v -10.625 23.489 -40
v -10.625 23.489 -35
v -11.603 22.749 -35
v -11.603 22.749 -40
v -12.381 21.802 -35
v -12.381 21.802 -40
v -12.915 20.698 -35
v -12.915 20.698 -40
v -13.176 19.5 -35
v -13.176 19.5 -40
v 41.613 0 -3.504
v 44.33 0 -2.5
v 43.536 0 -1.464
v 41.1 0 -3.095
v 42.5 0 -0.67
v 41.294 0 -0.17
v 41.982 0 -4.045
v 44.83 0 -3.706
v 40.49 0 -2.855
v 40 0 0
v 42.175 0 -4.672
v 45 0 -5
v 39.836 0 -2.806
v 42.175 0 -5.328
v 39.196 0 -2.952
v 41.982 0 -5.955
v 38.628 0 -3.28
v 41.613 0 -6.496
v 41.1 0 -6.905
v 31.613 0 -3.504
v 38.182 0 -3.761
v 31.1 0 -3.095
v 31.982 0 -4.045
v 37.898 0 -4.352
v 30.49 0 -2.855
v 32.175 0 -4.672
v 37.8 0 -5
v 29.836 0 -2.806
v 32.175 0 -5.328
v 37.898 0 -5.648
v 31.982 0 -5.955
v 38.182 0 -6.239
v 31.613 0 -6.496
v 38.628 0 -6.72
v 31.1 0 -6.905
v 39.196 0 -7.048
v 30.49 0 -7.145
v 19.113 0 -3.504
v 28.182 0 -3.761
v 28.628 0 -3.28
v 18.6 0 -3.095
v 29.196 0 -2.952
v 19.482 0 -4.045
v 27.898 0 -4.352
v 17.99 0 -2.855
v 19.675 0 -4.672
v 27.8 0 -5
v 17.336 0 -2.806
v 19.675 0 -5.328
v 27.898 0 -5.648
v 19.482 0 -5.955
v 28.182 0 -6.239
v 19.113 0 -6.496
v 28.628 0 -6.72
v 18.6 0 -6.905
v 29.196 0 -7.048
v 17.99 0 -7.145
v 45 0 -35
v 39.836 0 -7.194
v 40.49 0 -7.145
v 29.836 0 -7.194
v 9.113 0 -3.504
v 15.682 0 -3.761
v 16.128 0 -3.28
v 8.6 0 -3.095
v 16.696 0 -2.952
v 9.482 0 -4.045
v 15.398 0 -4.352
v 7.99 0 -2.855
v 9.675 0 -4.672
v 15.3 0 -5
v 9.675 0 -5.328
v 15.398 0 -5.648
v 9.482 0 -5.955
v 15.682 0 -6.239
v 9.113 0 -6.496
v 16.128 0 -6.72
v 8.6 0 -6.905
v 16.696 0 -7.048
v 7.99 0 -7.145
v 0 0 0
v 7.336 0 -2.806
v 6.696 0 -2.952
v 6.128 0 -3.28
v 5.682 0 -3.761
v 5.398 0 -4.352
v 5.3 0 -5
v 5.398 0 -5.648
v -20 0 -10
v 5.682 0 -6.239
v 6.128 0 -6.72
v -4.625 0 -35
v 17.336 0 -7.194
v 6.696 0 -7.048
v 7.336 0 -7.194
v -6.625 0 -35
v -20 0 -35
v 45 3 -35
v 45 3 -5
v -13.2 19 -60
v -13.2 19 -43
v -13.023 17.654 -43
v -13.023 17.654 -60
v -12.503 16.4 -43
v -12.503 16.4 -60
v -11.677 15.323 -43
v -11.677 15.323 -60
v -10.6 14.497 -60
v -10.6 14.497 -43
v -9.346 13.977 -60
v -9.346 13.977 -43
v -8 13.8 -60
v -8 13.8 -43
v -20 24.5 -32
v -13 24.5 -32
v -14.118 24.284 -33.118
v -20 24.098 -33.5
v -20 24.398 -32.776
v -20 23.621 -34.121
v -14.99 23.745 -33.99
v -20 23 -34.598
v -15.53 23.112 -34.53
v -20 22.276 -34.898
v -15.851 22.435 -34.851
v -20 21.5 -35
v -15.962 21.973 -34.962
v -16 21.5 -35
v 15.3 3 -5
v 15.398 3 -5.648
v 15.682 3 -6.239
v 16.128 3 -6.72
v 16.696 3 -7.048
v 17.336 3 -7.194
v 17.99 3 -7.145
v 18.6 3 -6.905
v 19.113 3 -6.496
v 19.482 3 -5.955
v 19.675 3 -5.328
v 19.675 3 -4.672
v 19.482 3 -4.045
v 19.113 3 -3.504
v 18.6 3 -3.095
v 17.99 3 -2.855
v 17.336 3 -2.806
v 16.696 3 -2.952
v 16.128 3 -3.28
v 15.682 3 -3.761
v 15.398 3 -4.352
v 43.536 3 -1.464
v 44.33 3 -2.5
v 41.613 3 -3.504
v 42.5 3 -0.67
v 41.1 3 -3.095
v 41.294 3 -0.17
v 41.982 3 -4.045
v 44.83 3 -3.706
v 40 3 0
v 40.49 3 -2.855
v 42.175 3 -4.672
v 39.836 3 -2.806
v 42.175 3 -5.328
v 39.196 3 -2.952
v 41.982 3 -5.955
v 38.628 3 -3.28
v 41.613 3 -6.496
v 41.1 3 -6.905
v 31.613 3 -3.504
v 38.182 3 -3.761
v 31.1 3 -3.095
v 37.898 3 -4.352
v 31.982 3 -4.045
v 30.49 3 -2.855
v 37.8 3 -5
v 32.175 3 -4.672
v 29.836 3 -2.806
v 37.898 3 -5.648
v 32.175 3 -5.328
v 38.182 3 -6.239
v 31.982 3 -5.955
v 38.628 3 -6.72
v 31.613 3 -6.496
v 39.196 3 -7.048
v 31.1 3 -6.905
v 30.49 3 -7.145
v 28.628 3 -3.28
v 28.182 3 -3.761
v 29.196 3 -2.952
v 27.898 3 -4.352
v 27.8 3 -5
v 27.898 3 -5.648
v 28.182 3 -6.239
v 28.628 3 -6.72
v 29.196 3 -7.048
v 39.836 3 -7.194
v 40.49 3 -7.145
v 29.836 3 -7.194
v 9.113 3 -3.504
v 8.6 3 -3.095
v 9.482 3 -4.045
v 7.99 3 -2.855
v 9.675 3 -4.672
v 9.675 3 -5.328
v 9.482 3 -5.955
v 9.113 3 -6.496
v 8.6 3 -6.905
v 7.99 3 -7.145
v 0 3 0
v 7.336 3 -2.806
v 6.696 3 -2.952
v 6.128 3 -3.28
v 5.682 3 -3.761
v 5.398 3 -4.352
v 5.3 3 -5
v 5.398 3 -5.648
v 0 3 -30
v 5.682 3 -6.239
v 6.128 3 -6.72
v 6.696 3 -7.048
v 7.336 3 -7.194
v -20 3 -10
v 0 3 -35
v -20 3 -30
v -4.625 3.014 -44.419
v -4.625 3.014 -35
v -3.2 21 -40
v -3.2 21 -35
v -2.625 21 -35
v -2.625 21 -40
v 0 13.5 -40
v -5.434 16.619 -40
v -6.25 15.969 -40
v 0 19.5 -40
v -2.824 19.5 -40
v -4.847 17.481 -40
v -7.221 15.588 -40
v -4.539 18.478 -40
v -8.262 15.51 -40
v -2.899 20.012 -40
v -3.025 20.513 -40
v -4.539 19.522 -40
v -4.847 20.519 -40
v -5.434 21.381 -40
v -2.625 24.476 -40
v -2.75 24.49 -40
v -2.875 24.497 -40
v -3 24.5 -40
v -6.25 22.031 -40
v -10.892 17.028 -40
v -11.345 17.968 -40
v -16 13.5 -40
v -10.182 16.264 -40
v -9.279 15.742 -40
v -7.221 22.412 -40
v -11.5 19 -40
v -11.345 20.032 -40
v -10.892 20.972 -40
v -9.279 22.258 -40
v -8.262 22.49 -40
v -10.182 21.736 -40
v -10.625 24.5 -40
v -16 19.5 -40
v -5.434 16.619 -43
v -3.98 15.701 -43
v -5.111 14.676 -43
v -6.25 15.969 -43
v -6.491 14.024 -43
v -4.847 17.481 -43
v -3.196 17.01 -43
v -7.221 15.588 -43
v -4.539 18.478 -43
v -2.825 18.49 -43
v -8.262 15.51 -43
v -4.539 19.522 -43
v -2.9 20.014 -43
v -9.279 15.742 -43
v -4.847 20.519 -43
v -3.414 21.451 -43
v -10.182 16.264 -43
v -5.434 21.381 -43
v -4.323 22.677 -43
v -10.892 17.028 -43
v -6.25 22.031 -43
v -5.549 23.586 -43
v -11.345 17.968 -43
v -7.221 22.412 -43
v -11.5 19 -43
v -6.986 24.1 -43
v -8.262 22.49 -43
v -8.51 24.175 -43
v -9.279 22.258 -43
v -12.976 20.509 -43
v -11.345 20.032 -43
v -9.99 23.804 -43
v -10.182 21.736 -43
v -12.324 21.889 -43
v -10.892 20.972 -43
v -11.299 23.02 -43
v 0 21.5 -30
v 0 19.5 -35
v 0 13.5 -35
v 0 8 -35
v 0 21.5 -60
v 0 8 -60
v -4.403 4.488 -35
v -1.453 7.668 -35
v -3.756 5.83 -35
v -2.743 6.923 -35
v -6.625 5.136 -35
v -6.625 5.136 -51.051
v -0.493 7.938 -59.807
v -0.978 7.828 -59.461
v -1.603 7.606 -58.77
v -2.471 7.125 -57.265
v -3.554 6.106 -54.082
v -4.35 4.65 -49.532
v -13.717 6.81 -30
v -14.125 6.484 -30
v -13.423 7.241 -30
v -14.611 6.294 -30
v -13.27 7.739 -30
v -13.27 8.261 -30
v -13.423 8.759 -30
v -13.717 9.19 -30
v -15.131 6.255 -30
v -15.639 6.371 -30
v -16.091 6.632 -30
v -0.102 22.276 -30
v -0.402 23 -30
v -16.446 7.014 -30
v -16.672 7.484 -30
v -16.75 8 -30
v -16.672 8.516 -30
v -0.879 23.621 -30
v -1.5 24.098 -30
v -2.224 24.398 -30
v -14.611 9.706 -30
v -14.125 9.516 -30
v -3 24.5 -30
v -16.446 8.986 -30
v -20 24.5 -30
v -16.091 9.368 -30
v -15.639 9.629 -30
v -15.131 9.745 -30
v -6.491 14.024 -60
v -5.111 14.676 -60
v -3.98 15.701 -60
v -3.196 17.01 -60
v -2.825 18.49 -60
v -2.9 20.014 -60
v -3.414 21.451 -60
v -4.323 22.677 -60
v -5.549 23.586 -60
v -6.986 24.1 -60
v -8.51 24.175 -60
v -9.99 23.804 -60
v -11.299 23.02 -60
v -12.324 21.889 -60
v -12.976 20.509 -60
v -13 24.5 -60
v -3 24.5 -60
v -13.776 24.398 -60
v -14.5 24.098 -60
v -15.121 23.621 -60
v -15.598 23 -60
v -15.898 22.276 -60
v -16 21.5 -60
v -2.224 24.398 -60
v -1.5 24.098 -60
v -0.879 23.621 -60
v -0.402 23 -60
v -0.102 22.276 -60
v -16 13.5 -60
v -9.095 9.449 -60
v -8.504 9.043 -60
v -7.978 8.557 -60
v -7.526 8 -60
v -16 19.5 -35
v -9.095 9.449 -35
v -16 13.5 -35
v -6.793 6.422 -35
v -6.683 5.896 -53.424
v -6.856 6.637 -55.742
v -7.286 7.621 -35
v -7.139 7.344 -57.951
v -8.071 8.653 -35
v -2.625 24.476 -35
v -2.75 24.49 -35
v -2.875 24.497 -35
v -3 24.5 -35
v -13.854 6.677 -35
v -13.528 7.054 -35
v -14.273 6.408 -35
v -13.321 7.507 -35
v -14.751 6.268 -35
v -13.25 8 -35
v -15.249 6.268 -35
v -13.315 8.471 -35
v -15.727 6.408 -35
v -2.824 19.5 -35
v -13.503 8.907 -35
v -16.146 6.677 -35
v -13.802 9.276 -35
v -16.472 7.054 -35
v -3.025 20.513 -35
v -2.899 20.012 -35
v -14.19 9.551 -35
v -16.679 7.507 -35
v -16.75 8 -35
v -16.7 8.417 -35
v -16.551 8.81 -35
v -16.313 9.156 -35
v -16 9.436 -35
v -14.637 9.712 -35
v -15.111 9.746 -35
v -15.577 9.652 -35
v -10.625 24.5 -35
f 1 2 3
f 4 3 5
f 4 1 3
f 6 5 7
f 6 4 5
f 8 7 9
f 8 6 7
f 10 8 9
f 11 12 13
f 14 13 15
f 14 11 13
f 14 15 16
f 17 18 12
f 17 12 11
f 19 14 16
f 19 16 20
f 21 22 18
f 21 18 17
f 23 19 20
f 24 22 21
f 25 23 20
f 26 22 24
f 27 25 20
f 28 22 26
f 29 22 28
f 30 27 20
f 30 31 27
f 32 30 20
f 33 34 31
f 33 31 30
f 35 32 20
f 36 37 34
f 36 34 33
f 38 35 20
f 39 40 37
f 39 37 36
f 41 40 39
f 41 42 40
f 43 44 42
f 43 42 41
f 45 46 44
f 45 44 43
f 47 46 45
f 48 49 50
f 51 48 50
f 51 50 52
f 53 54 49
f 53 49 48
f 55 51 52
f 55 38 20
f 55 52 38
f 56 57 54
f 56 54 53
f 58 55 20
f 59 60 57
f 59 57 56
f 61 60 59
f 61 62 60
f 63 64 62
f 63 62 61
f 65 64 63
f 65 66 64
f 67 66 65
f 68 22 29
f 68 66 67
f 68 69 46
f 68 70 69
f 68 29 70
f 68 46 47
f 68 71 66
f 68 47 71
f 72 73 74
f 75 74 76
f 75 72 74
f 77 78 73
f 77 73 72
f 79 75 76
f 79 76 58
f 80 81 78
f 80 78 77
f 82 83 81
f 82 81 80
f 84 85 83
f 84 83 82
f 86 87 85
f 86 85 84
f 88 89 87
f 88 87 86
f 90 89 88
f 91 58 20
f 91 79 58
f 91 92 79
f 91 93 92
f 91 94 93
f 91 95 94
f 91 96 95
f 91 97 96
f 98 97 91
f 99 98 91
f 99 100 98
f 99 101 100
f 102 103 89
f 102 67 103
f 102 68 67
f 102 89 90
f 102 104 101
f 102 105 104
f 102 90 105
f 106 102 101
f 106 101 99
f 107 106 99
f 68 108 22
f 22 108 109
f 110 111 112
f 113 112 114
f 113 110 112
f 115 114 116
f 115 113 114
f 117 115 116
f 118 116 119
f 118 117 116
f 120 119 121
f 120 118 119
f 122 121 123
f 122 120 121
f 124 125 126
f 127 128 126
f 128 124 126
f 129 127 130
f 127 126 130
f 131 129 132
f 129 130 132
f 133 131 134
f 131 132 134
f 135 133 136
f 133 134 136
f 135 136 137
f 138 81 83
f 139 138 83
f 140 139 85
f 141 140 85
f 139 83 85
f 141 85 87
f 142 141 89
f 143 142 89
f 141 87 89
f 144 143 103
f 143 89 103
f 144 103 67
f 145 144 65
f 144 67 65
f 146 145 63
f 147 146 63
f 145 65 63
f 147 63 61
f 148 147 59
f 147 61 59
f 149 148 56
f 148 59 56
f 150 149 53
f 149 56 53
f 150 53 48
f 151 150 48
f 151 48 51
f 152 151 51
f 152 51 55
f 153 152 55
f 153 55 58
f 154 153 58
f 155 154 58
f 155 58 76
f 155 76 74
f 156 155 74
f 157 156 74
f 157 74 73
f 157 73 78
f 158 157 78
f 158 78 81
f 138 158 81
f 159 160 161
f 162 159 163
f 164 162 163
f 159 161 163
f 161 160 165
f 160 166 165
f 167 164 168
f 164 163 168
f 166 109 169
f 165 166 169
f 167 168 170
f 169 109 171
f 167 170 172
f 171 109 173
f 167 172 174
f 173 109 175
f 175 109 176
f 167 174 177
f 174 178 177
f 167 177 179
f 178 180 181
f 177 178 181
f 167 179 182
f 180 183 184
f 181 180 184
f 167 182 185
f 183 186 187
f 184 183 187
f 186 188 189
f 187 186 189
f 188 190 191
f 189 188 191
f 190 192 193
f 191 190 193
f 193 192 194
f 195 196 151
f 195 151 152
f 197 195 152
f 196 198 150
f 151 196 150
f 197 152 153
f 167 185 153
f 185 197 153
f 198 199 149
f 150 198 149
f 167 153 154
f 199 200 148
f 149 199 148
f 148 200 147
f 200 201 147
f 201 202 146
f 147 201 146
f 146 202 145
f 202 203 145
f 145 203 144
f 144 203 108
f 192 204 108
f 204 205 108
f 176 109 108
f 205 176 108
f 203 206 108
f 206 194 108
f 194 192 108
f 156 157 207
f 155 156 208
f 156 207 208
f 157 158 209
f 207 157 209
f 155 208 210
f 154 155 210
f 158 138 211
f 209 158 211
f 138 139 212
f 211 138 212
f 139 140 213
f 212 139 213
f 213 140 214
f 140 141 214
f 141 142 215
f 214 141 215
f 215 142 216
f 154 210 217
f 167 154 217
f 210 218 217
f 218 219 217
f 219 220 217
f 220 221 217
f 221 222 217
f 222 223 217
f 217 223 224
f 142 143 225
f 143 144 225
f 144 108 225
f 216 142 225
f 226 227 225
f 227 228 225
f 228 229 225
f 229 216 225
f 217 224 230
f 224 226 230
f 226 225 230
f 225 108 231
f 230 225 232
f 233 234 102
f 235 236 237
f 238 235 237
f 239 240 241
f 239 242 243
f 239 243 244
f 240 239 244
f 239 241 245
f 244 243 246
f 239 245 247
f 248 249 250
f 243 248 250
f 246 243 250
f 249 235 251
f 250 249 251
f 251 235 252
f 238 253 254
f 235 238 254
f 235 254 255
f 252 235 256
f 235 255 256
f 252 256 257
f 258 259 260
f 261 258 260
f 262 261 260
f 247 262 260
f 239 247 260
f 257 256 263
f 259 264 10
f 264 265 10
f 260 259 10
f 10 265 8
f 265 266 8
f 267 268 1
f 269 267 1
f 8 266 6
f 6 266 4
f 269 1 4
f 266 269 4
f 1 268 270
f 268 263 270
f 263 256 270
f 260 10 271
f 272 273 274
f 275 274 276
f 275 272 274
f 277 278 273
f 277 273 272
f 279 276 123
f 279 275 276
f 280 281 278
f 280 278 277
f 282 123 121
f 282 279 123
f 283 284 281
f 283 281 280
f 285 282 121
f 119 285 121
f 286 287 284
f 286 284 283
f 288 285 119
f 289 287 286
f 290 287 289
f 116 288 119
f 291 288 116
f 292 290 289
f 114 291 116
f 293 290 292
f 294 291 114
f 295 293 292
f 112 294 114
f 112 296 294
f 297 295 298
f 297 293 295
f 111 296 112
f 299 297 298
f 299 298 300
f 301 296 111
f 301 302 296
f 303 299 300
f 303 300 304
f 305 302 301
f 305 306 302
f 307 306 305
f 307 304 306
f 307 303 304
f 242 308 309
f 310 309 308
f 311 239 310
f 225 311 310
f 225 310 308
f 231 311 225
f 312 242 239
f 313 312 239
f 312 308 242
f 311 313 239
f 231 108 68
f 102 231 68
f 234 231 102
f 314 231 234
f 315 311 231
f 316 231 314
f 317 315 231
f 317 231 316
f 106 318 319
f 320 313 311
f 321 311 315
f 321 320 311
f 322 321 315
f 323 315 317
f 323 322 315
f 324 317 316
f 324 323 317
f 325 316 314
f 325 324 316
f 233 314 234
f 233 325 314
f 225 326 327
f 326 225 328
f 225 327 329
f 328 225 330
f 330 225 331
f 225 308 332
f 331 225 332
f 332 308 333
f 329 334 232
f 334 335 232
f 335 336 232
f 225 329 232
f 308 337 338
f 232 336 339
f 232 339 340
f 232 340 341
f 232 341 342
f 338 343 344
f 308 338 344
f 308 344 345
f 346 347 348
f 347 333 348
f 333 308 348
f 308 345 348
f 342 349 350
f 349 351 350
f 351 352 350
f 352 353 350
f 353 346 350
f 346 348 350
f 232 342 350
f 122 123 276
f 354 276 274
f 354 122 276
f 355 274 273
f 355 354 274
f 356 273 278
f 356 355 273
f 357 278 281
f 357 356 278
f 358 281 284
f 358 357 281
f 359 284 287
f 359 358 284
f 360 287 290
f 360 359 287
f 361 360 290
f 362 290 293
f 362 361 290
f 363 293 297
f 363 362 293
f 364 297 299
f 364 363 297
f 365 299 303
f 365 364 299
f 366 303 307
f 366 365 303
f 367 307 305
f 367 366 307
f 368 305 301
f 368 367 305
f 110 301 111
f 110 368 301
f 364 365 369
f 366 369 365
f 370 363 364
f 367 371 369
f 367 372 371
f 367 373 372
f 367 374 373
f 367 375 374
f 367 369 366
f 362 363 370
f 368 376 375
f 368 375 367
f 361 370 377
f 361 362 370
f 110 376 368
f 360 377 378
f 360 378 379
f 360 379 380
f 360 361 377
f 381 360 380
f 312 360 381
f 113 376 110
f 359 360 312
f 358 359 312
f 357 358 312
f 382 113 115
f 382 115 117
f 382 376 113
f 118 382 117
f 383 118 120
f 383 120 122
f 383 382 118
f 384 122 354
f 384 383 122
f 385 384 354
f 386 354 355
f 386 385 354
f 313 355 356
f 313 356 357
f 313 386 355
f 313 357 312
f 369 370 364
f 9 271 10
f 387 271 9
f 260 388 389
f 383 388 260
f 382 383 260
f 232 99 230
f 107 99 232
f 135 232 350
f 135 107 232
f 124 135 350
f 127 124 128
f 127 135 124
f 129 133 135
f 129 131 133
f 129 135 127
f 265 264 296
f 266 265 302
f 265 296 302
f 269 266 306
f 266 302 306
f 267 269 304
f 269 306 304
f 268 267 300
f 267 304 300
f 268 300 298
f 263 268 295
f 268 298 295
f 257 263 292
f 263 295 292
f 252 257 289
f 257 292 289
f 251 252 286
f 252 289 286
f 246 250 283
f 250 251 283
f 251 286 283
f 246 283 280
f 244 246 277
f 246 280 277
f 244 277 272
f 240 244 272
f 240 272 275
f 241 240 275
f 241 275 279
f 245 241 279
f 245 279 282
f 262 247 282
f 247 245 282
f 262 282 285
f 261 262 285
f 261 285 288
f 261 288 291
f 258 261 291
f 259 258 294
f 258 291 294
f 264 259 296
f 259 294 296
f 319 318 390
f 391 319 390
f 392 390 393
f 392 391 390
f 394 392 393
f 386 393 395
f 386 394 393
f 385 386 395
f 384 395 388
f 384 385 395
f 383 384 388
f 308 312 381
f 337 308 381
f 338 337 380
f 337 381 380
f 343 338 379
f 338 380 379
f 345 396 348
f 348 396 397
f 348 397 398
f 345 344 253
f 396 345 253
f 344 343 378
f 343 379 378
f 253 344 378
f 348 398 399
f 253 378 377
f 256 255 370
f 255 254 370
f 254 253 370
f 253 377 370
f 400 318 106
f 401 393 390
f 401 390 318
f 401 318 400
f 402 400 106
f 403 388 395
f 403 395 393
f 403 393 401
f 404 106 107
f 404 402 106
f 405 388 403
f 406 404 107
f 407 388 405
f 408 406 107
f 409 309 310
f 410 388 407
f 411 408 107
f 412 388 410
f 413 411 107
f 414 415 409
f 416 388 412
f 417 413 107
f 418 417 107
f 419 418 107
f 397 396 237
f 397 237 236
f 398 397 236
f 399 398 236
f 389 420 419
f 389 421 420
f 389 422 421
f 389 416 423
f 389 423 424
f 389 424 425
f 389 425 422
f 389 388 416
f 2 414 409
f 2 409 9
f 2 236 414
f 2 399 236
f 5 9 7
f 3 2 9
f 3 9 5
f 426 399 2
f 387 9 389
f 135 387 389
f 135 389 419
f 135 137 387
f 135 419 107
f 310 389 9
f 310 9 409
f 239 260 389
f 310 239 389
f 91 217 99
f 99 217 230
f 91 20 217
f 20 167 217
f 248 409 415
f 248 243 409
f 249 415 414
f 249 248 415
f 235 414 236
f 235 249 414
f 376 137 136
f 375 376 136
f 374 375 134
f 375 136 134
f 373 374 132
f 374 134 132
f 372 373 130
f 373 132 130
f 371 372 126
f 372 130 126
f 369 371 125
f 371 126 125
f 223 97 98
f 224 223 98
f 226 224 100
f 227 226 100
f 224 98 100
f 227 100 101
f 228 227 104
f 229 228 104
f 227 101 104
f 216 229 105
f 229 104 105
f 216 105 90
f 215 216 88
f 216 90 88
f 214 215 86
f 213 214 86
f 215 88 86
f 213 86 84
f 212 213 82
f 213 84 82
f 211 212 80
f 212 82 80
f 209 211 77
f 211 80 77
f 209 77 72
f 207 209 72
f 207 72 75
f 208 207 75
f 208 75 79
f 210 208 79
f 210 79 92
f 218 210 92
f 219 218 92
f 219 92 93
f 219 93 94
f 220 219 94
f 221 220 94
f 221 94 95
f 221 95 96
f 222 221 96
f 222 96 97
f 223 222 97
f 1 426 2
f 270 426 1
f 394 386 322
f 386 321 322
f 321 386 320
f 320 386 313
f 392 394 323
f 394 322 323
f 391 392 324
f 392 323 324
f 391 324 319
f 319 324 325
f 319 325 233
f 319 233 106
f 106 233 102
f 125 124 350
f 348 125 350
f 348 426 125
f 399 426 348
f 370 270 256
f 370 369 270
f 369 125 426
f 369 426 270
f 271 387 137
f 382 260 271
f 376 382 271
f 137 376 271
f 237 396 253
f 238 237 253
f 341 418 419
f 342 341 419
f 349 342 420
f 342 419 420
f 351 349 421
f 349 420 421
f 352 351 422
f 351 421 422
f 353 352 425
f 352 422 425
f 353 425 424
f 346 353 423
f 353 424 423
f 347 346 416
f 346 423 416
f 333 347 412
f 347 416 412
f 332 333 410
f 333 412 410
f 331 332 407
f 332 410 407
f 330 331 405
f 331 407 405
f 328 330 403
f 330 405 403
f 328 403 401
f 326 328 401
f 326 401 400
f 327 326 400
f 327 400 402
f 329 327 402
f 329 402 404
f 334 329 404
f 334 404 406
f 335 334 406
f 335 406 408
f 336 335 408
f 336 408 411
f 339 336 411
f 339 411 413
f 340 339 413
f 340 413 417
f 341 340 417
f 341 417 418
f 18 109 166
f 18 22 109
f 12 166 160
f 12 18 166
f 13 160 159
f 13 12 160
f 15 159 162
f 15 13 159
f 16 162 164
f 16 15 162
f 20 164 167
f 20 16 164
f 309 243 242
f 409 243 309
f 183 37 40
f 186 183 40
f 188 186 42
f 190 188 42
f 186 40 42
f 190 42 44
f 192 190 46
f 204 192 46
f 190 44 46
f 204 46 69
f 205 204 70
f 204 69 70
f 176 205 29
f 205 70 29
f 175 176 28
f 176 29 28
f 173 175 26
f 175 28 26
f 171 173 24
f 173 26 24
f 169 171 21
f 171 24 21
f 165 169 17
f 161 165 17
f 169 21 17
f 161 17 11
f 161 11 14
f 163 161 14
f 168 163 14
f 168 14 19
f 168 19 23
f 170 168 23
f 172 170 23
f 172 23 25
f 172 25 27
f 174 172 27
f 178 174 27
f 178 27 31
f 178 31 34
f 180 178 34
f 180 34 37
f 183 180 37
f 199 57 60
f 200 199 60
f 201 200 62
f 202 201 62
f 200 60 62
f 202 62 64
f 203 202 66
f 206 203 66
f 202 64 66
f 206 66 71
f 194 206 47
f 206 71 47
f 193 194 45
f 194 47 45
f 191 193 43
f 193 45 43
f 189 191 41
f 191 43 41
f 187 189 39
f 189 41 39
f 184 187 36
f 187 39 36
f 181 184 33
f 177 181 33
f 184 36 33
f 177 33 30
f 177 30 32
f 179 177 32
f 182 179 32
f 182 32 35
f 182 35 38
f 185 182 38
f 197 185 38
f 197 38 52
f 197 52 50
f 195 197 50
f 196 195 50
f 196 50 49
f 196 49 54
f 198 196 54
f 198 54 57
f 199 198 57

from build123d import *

# Parameters (mm, degrees)
SKETCH_4_W              = 25
SKETCH_4_H              = 10
EXTRUDE_1_DEPTH         = 3
HOLE_WIZARD_4_4_4_4_1_D = 4.4
SKETCH_8_W              = 65
SKETCH_8_H              = 25
EXTRUDE_2_DEPTH         = 3
SKETCH_18_W             = 20
SKETCH_18_H             = 25
CUT_EXTRUDE_1_DEPTH     = 10
SKETCH_19_W             = 20
SKETCH_19_H             = 25
EXTRUDE_3_DEPTH         = 3
EXTRUDE_4_DEPTH         = 3
SKETCH_21_W             = 65
SKETCH_21_H             = 5
EXTRUDE_5_DEPTH         = 15
SKETCH_23_W             = 32.5
SKETCH_23_H             = 5
CUT_EXTRUDE_2_DEPTH     = 15
HOLE_WIZARD_3_5_3_5_1_D = 3.5
SKETCH_28_W             = 18
SKETCH_28_H             = 25
EXTRUDE_6_DEPTH         = 3
SKETCH_30_W             = 15
SKETCH_30_H             = 25
EXTRUDE_8_DEPTH         = 15
HOLE_WIZARD_1_D         = 10.2
EXTRUDE_9_DEPTH         = 3
EXTRUDE_10_DEPTH        = 3
HOLE_WIZARD_2_D         = 6
FILLET_4_R              = 3
SKETCH_39_W             = 18
SKETCH_39_H             = 28
CUT_EXTRUDE_3_DEPTH     = 75.283241717
SKETCH_40_W             = 32.5
SKETCH_40_H             = 15
EXTRUDE_11_DEPTH        = 5
EXTRUDE_START           = 25
EXTRUDE_12_DEPTH        = 25
EXTRUDE_START_2         = 3
SKETCH_45_R             = 5.2
SKETCH_45_R_2           = 3.5
EXTRUDE_15_DEPTH        = 3
SKETCH_46_W             = 5
SKETCH_46_H             = 3
CUT_EXTRUDE_4_DEPTH     = 90.140338792
SKETCH_50_W             = 8
SKETCH_50_H             = 5
CUT_EXTRUDE_5_DEPTH     = 4
CUT_EXTRUDE_6_DEPTH     = 25
CUT_EXTRUDE_7_DEPTH     = 25
EXTRUDE_16_DEPTH        = 2
FILLET_6_R              = 5
SKETCH_56_W             = 65.702290987
SKETCH_56_H             = 31.946087045
CUT_EXTRUDE_10_DEPTH    = 0.5
SKETCH_58_W             = 45
SKETCH_58_H             = 21.5
CUT_EXTRUDE_11_DEPTH    = 10
FILLET_7_R              = 3
EXTRUDE_17_DEPTH        = 3
HOLE_WIZARD_4_4_4_4_2_D = 4.4
FILLET_8_R              = 5


with BuildPart() as part:
    # 草图4 → 凸台-拉伸1 (new body)
    with BuildSketch(Plane(origin=(0, 0, 0), x_dir=(1, 0, 0), z_dir=(0, 1, 0))):
        with Locations((12.5, 5)):
            Rectangle(SKETCH_4_W, SKETCH_4_H)
    extrude(amount=EXTRUDE_1_DEPTH)

    # Ø4.4 (4.4) 直径孔1 (through all)
    with Locations(Plane(origin=(0, 3, 0), x_dir=(1, 0, 0), z_dir=(0, 1, 0))):
        with Locations((7.5, 5), (17.5, 5)):
            Hole(HOLE_WIZARD_4_4_4_4_1_D / 2)

    # 草图8 → 凸台-拉伸2 (add)
    with BuildSketch(Plane.XZ):
        with Locations((32.5, -22.5)):
            Rectangle(SKETCH_8_W, SKETCH_8_H)
    extrude(amount=-EXTRUDE_2_DEPTH)

    # 草图18 → 切除-拉伸1 (cut)
    with BuildSketch(Plane(origin=(0, 3, 0), x_dir=(1, 0, 0), z_dir=(0, 1, 0))):
        with Locations((55, 22.5)):
            Rectangle(SKETCH_18_W, SKETCH_18_H)
    extrude(amount=-CUT_EXTRUDE_1_DEPTH, mode=Mode.SUBTRACT)

    # 草图19 → 凸台-拉伸3 (add)
    with BuildSketch(Plane(origin=(0, 3, 0), x_dir=(1, 0, 0), z_dir=(0, 1, 0))):
        with Locations((-10, 22.5)):
            Rectangle(SKETCH_19_W, SKETCH_19_H)
    extrude(amount=-EXTRUDE_3_DEPTH)

    # 草图20 → 凸台-拉伸4 (add)
    with BuildSketch(Plane(origin=(0, 3, 0), x_dir=(1, 0, 0), z_dir=(0, 1, 0))):
        Polygon((-20, 10), (0, 10), (0, 0), align=None)
        Polygon((25, 10), (45, 10), (25, 0), align=None)
    extrude(amount=-EXTRUDE_4_DEPTH)

    # 草图21 → 凸台-拉伸5 (add)
    with BuildSketch(Plane(origin=(0, 3, 0), x_dir=(1, 0, 0), z_dir=(0, 1, 0))):
        with Locations((12.5, 32.5)):
            Rectangle(SKETCH_21_W, SKETCH_21_H)
    extrude(amount=EXTRUDE_5_DEPTH)

    # 草图23 → 切除-拉伸2 (cut)
    with BuildSketch(Plane(origin=(0, 18, 0), x_dir=(1, 0, 0), z_dir=(0, 1, 0))):
        with Locations((28.75, 32.5)):
            Rectangle(SKETCH_23_W, SKETCH_23_H)
    extrude(amount=-CUT_EXTRUDE_2_DEPTH, mode=Mode.SUBTRACT)

    # Ø3.5 (3.5) 直径孔1 (through all)
    with Locations(Plane.XY.offset(-30)):
        with Locations((-15, 8)):
            Hole(HOLE_WIZARD_3_5_3_5_1_D / 2)

    # 草图28 → 凸台-拉伸6 (add)
    with BuildSketch(Plane(origin=(0, 3, 0), x_dir=(1, 0, 0), z_dir=(0, 1, 0))):
        with Locations((54, 22.5)):
            Rectangle(SKETCH_28_W, SKETCH_28_H)
    extrude(amount=-EXTRUDE_6_DEPTH)

    # 草图30 → 凸台-拉伸8 (add)
    with BuildSketch(Plane(origin=(0, 3, 0), x_dir=(1, 0, 0), z_dir=(0, 1, 0))):
        with Locations((55.5, 22.5)):
            Rectangle(SKETCH_30_W, SKETCH_30_H)
    extrude(amount=EXTRUDE_8_DEPTH)

    # 孔1 (through all)
    with Locations(Plane(origin=(0, 0, -35), x_dir=(-1, 0, 0), z_dir=(0, 0, -1))):
        with Locations((-55.5, 10.5)):
            Hole(HOLE_WIZARD_1_D / 2)

    # 草图35 → 凸台-拉伸9 (add)
    with BuildSketch(Plane.XY.offset(-10)):
        Polygon((48, 18), (45, 3), (45, 0), (63, 0), (63, 18), align=None)
    extrude(amount=EXTRUDE_9_DEPTH)

    # 草图36 → 凸台-拉伸10 (add)
    with BuildSketch(Plane(origin=(0, 3, 0), x_dir=(1, 0, 0), z_dir=(0, 1, 0))):
        Polygon((25, 0), (45, 7), (45, 10), align=None)
    extrude(amount=-EXTRUDE_10_DEPTH)

    # 孔2 (through all)
    with Locations(Plane(origin=(0, 0, -10), x_dir=(-1, 0, 0), z_dir=(0, 0, -1))):
        with Locations((-55.5, 10.5)):
            Hole(HOLE_WIZARD_2_D / 2)

    # 圆角4
    fillet_4_edges = [part.edges().sort_by_distance(p)[0] for p in [
        (63, 18, -21),
    ]]
    fillet(fillet_4_edges, radius=FILLET_4_R)

    # 草图39 → 切除-拉伸3 (cut, through all)
    with BuildSketch(Plane.XZ):
        with Locations((54, -21)):
            Rectangle(SKETCH_39_W, SKETCH_39_H)
    extrude(amount=-CUT_EXTRUDE_3_DEPTH, mode=Mode.SUBTRACT)

    # 草图40 → 凸台-拉伸11 (add)
    with BuildSketch(Plane(origin=(0, 0, -35), x_dir=(-1, 0, 0), z_dir=(0, 0, -1))):
        with Locations((-28.75, 10.5)):
            Rectangle(SKETCH_40_W, SKETCH_40_H)
        Polygon((-12.5, 18), (20, 18), (20, 25), (-45, 25), (-45, 18), align=None)
    extrude(amount=-EXTRUDE_11_DEPTH)

    # 草图41 → 凸台-拉伸12 (add)
    with BuildSketch(Plane(origin=(0, 0, -35), x_dir=(-1, 0, 0), z_dir=(0, 0, -1)).offset(EXTRUDE_START)):
        with BuildLine():
            Line((8, 8), (13.25, 8))
            ThreePointArc((13.25, 8), (14.189907413, 9.551209206), (16, 9.436140662))
            Line((16, 9.436140662), (16, 25))
            Line((16, 25), (0, 25))
            Line((0, 25), (0, 8))
            Line((0, 8), (8, 8))
        make_face()
        with BuildLine():
            ThreePointArc((13.2, 19), (11.676955262, 15.323044738), (8, 13.8))
            ThreePointArc((8, 13.8), (4.323044738, 22.676955262), (13.2, 19))
        make_face(mode=Mode.SUBTRACT)
    extrude(amount=-EXTRUDE_12_DEPTH)

    # 草图45 → 凸台-拉伸15 (add)
    with BuildSketch(Plane(origin=(0, 0, -40), x_dir=(-1, 0, 0), z_dir=(0, 0, -1)).offset(EXTRUDE_START_2)):
        with Locations((8, 19)):
            Circle(SKETCH_45_R)
        with Locations((8, 19)):
            Circle(SKETCH_45_R_2, mode=Mode.SUBTRACT)
    extrude(amount=-EXTRUDE_15_DEPTH)

    # 草图46 → 切除-拉伸4 (cut, through all)
    with BuildSketch(Plane.ZY.offset(16)):
        with Locations((-37.5, 18)):
            Rectangle(SKETCH_46_W, SKETCH_46_H)
        with Locations((-37.5, 15)):
            Rectangle(SKETCH_46_W, SKETCH_46_H)
    extrude(amount=-CUT_EXTRUDE_4_DEPTH, mode=Mode.SUBTRACT)

    # 草图50 → 切除-拉伸5 (cut)
    with BuildSketch(Plane(origin=(0, 25, 0), x_dir=(1, 0, 0), z_dir=(0, 1, 0))):
        with Locations((-6.625, 37.5)):
            Rectangle(SKETCH_50_W, SKETCH_50_H)
    extrude(amount=-CUT_EXTRUDE_5_DEPTH, mode=Mode.SUBTRACT)

    # 草图51 → 切除-拉伸6 (cut)
    with BuildSketch(Plane(origin=(0, 0, -60), x_dir=(-1, 0, 0), z_dir=(0, 0, -1))):
        Polygon((16, 13.5), (10.5, 8), (16, 8), align=None)
    extrude(amount=-CUT_EXTRUDE_6_DEPTH, mode=Mode.SUBTRACT)

    # 草图52 → 切除-拉伸7 (cut)
    with BuildSketch(Plane(origin=(0, 0, -60), x_dir=(-1, 0, 0), z_dir=(0, 0, -1))):
        Polygon((6.625, 8), (16, 13.5), (10.5, 8), align=None)
    extrude(amount=-CUT_EXTRUDE_7_DEPTH, mode=Mode.SUBTRACT)

    # 草图54 → 凸台-拉伸16 (add)
    with BuildSketch(Plane(origin=(-6.625, 0, 0), x_dir=(0, 0, -1), z_dir=(1, 0, 0))):
        Polygon((35, 0), (60, 8), (35, 8), align=None)
    extrude(amount=EXTRUDE_16_DEPTH)

    # 圆角6
    # the kernel refuses this fillet: 5 mm, written as the material it adds along each edge
    with BuildSketch(Plane(origin=(-6.625, 8, -60), x_dir=(-0.8625249057662363, 0.5060146113828583, 0), z_dir=(0, 0, 1))) as fillet_6_piece_1_section:
        with BuildLine():
            CenterArc((FILLET_6_R * 0.572720144444, FILLET_6_R), FILLET_6_R, 210.398727714, 59.601272286)
            Line((-FILLET_6_R * 0.289804761322, FILLET_6_R * 0.493985388617), (0, 0))
            Line((0, 0), (FILLET_6_R * 0.572720144444, 0))
        make_face()
    fillet_6_piece_1 = extrude(amount=32.159001806, mode=Mode.PRIVATE)
    fillet_6_piece_1 = split(fillet_6_piece_1, bisect_by=Plane(origin=(-6.625, 8, -30), z_dir=(0, 0, -1)), keep=Keep.TOP, mode=Mode.PRIVATE)
    fillet_6_piece_1 = split(fillet_6_piece_1, bisect_by=Plane(origin=(-6.625, 8, -60), z_dir=(0, 0.9524241471993243, 0.3047757271037836)), keep=Keep.TOP, mode=Mode.PRIVATE)
    add(fillet_6_piece_1)
    with BuildSketch(Plane(origin=(-4.625, 8, -72.464794172), x_dir=(0, -1, 0), z_dir=(0, 0, 1))) as fillet_6_piece_2_section:
        with BuildLine():
            CenterArc((4.985917669, 5), FILLET_6_R, 184.301222305, 85.698777695)
            Line((0, 4.625), (0, 0))
            Line((0, 0), (4.985917669, 0))
        make_face()
    fillet_6_piece_2 = extrude(amount=49.929588344, mode=Mode.PRIVATE)
    fillet_6_piece_2 = split(fillet_6_piece_2, bisect_by=Plane(origin=(-4.625, 8, -30), z_dir=(0, 0, -1)), keep=Keep.TOP, mode=Mode.PRIVATE)
    fillet_6_piece_2 = split(fillet_6_piece_2, bisect_by=Plane(origin=(-4.625, 11.618227626, -71.306961332), z_dir=(0, 0.9524241471993243, 0.3047757271037836)), keep=Keep.TOP, mode=Mode.PRIVATE)
    add(fillet_6_piece_2)

    # 草图56 → 切除-拉伸10 (cut)
    with BuildSketch(Plane(origin=(0, 25, 0), x_dir=(1, 0, 0), z_dir=(0, 1, 0))):
        with Locations((12.851145494, 45.973043523)):
            Rectangle(SKETCH_56_W, SKETCH_56_H)
    extrude(amount=-CUT_EXTRUDE_10_DEPTH, mode=Mode.SUBTRACT)

    # 草图58 → 切除-拉伸11 (cut)
    with BuildSketch(Plane(origin=(0, 0, -35), x_dir=(-1, 0, 0), z_dir=(0, 0, -1))):
        with Locations((-22.5, 13.75)):
            Rectangle(SKETCH_58_W, SKETCH_58_H)
    extrude(amount=-CUT_EXTRUDE_11_DEPTH, mode=Mode.SUBTRACT)

    # 圆角7
    # the kernel refuses this fillet: 3 mm, written as the material it takes off along each edge
    with BuildSketch(Plane(origin=(0, 24.5, -67.5), x_dir=(0, -1, 0), z_dir=(0, 0, 1))) as fillet_7_piece_1:
        with BuildLine():
            CenterArc((FILLET_7_R, -FILLET_7_R), FILLET_7_R, 90, 90)
            Line((0, -FILLET_7_R), (0, 0))
            Line((0, 0), (FILLET_7_R, 0))
        make_face()
    extrude(amount=45, mode=Mode.SUBTRACT)
    with BuildSketch(Plane(origin=(-16, 24.5, -35), x_dir=(0, -1, 0), z_dir=(0, 0, -1))) as fillet_7_piece_2:
        with BuildLine():
            CenterArc((FILLET_7_R, -FILLET_7_R), FILLET_7_R, 90, 90)
            Line((0, -FILLET_7_R), (0, 0))
            Line((0, 0), (FILLET_7_R, 0))
        make_face()
    extrude(amount=32.5, mode=Mode.SUBTRACT)
    with BuildSketch(Plane(origin=(-16, 24.5, -35), x_dir=(0, -1, 0), z_dir=(-1, 0, 0))) as fillet_7_piece_3:
        with BuildLine():
            CenterArc((FILLET_7_R, FILLET_7_R), FILLET_7_R, 180, 90)
            Line((0, FILLET_7_R), (0, 0))
            Line((0, 0), (FILLET_7_R, 0))
        make_face()
    extrude(amount=11.5, mode=Mode.SUBTRACT)
    with BuildSketch(Plane(origin=(-16, 24.5, -27.5), x_dir=(0, -1, 0), z_dir=(0, 0, -1))) as fillet_7_piece_4a_section:
        with BuildLine():
            CenterArc((FILLET_7_R, -FILLET_7_R), FILLET_7_R, 90, 90)
            Line((0, -FILLET_7_R), (0, 0))
            Line((0, 0), (FILLET_7_R, 0))
        make_face()
    fillet_7_piece_4a = extrude(amount=32.5, mode=Mode.PRIVATE)
    fillet_7_piece_4a = split(fillet_7_piece_4a, bisect_by=Plane(origin=(-16, 24.5, -35), z_dir=(0, 0, 1)), keep=Keep.TOP, mode=Mode.PRIVATE)
    fillet_7_piece_4a = split(fillet_7_piece_4a, bisect_by=Plane(origin=(-16, 24.5, -30), z_dir=(0, 0, -1)), keep=Keep.TOP, mode=Mode.PRIVATE)
    with BuildSketch(Plane(origin=(-8.5, 24.5, -35), x_dir=(0, -1, 0), z_dir=(-1, 0, 0))) as fillet_7_piece_4b_section:
        with BuildLine():
            CenterArc((FILLET_7_R, FILLET_7_R), FILLET_7_R, 180, 90)
            Line((0, FILLET_7_R), (0, 0))
            Line((0, 0), (FILLET_7_R, 0))
        make_face()
    fillet_7_piece_4b = extrude(amount=11.5, mode=Mode.PRIVATE)
    fillet_7_piece_4b = split(fillet_7_piece_4b, bisect_by=Plane(origin=(-16, 24.5, -35), z_dir=(1, 0, 0)), keep=Keep.TOP, mode=Mode.PRIVATE)
    fillet_7_piece_4b = fillet_7_piece_4b - Plane(origin=(-8, 19, -35), x_dir=(-1, 0, 0), z_dir=(0, 0, -1)) * Cylinder(5.2, 35, mode=Mode.PRIVATE)
    fillet_7_piece_4b = split(fillet_7_piece_4b, bisect_by=Plane(origin=(-10.625, 24.5, -35), z_dir=(-1, 0, 0)), keep=Keep.TOP, mode=Mode.PRIVATE)
    fillet_7_piece_4 = fillet_7_piece_4a & fillet_7_piece_4b
    add(fillet_7_piece_4, mode=Mode.SUBTRACT)

    # 草图60 → 凸台-拉伸17 (add)
    with BuildSketch(Plane(origin=(0, 3, 0), x_dir=(1, 0, 0), z_dir=(0, 1, 0))):
        Polygon((45, 7), (45, 0), (25, 0), align=None)
    extrude(amount=-EXTRUDE_17_DEPTH)

    # Ø4.4 (4.4) 直径孔2 (through all)
    with Locations(Plane(origin=(0, 3, 0), x_dir=(1, 0, 0), z_dir=(0, 1, 0))):
        with Locations((30, 5), (40, 5)):
            Hole(HOLE_WIZARD_4_4_4_4_2_D / 2)

    # 圆角8
    fillet_8_edges = [part.edges().sort_by_distance(p)[0] for p in [
        (45, 1.5, 0),
    ]]
    fillet(fillet_8_edges, radius=FILLET_8_R)


solid = part.part
